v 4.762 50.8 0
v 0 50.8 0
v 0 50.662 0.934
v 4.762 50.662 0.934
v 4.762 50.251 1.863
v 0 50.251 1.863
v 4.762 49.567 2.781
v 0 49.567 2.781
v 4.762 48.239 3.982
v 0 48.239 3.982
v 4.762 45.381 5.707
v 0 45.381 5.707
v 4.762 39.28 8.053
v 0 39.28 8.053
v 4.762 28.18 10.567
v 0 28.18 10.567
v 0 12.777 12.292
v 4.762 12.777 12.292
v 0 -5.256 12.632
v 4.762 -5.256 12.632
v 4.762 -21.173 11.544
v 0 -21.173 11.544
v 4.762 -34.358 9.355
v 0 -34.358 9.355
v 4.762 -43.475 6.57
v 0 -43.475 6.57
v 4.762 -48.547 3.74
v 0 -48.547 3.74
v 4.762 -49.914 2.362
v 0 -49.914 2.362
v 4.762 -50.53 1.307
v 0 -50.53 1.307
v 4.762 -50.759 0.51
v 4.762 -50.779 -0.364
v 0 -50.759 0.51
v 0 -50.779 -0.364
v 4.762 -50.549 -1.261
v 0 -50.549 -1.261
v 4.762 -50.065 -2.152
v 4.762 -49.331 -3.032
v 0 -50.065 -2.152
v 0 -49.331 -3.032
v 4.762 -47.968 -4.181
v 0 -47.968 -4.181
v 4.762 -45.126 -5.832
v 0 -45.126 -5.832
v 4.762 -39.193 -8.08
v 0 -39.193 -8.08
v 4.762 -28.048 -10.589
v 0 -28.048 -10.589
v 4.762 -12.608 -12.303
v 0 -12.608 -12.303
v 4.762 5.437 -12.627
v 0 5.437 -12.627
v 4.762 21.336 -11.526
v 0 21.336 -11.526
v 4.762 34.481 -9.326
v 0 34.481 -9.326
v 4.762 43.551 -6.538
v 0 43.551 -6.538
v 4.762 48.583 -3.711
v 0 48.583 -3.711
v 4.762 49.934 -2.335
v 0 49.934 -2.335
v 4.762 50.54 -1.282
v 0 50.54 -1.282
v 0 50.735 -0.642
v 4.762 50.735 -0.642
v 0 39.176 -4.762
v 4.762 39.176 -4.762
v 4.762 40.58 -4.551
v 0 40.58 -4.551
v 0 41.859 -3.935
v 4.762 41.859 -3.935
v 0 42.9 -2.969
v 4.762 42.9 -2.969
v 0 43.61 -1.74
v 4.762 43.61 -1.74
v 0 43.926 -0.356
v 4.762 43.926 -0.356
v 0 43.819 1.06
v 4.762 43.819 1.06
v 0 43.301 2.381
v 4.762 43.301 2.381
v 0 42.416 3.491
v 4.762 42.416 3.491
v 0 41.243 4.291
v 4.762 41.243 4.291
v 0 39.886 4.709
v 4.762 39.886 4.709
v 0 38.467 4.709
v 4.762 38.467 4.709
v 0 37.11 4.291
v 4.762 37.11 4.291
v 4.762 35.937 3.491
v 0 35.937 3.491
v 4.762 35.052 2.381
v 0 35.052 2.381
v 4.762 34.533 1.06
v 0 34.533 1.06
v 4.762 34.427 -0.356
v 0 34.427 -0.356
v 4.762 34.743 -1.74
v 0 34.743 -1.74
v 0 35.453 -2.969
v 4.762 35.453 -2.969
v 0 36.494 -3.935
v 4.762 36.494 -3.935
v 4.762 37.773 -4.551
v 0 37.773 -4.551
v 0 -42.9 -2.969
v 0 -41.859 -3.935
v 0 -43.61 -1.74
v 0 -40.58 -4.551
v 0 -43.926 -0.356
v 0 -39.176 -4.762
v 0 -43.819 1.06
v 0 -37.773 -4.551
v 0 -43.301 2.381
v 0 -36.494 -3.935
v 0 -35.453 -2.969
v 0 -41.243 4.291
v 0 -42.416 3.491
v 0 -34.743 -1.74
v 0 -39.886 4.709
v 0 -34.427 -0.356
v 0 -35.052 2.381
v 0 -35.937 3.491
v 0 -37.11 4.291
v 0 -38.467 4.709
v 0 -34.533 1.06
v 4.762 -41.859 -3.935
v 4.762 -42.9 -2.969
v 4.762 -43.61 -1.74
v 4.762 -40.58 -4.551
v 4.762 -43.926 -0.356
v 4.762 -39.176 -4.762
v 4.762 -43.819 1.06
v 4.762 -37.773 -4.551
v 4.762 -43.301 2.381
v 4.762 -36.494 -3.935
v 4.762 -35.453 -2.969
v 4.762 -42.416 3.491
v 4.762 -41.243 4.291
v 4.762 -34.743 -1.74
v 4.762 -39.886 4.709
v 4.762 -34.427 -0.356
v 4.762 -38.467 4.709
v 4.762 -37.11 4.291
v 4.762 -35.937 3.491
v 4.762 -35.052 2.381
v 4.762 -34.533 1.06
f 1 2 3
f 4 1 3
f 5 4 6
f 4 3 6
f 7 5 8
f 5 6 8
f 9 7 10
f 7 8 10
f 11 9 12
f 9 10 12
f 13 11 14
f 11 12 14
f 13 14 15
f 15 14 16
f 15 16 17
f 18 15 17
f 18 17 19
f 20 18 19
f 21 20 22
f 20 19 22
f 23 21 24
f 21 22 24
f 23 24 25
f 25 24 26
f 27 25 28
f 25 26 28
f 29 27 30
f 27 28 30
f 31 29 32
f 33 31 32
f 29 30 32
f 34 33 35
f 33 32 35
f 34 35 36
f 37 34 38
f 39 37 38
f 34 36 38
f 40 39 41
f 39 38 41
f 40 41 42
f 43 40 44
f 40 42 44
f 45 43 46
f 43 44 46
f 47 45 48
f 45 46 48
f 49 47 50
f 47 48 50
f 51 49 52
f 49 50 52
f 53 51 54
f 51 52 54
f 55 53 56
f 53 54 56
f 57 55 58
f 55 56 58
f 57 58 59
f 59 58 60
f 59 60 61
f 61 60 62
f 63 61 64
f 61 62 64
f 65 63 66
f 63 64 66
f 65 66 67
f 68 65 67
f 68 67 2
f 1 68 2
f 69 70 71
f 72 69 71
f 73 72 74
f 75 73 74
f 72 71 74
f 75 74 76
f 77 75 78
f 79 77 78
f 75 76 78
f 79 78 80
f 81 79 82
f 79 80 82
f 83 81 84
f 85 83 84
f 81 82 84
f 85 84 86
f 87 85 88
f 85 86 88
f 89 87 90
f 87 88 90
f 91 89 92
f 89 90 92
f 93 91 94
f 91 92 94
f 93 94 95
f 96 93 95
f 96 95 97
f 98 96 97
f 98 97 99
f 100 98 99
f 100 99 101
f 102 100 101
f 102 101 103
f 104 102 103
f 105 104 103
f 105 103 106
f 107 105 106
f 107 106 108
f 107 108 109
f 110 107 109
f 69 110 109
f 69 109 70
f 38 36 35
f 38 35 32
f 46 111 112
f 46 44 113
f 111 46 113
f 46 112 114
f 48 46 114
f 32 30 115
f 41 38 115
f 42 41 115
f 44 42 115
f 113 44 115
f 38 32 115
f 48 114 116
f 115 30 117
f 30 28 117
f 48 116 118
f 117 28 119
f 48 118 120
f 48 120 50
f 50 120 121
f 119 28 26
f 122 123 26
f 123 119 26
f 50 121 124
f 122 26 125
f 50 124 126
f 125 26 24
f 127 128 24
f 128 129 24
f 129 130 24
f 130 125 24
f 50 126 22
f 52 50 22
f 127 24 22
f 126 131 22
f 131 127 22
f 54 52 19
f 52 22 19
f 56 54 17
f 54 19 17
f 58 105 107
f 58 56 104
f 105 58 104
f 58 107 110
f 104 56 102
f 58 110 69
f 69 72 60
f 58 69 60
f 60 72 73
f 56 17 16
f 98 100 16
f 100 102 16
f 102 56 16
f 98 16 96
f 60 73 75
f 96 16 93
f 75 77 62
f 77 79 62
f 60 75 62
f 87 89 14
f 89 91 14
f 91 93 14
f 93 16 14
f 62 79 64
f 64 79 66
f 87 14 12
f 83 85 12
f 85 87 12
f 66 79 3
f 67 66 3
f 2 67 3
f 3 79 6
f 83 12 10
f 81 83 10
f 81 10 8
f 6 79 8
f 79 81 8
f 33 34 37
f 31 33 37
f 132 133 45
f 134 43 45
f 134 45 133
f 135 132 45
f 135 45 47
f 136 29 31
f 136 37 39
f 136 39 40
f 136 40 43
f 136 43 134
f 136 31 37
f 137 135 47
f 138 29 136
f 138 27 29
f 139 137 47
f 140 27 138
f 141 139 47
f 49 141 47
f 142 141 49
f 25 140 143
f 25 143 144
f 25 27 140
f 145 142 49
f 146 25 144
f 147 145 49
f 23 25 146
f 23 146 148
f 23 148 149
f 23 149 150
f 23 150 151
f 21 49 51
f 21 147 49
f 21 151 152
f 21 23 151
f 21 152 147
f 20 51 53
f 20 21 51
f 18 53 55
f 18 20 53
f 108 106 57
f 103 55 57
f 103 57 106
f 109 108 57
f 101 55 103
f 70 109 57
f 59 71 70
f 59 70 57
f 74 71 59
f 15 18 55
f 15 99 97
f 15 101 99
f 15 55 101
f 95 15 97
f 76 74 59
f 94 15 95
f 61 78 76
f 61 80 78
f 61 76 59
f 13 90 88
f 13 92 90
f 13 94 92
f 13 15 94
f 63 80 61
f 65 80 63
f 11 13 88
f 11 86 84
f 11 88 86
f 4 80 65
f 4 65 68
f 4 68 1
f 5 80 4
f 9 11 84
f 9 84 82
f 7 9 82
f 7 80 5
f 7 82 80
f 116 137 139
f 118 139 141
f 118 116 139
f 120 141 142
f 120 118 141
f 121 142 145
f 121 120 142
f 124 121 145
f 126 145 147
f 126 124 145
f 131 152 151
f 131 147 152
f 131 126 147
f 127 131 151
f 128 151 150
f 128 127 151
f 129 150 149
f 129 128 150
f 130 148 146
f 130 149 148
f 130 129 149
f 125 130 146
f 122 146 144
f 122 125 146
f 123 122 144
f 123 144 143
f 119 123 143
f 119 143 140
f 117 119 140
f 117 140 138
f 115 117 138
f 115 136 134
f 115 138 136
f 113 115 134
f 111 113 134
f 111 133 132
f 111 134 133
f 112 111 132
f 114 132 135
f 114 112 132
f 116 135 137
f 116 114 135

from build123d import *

# Parameters (mm, degrees)
SKETCH2_RX          = 50.8
SKETCH2_RY          = 12.7
BOSS_EXTRUDE1_DEPTH = 4.7625
SKETCH3_R           = 4.7625
CUT_EXTRUDE1_DEPTH  = 5.7625
SKETCH4_R           = 4.7625
CUT_EXTRUDE10_DEPTH = 5.7625


with BuildPart() as part:
    # Sketch2 → Boss-Extrude1 (new body)
    with BuildSketch(Plane(origin=(0, 0, 0), x_dir=(0, 0, -1), z_dir=(1, 0, 0))):
        with Locations(Location((0, 0), (0, 0, 90))):
            Ellipse(SKETCH2_RX, SKETCH2_RY)
    extrude(amount=BOSS_EXTRUDE1_DEPTH)

    # Sketch3 → Cut-Extrude1 (cut, through all)
    with BuildSketch(Plane(origin=(4.7625, 0, 0), x_dir=(0, 0, -1), z_dir=(1, 0, 0))):
        with Locations((0, 39.176379409)):
            Circle(SKETCH3_R)
    extrude(amount=-CUT_EXTRUDE1_DEPTH, mode=Mode.SUBTRACT)

    # Sketch4 → Cut-Extrude10 (cut, through all)
    with BuildSketch(Plane(origin=(0, 0, 0), x_dir=(0, 0, -1), z_dir=(1, 0, 0))):
        with Locations((0, -39.1763758)):
            Circle(SKETCH4_R)
    extrude(amount=CUT_EXTRUDE10_DEPTH, mode=Mode.SUBTRACT)


solid = part.part
